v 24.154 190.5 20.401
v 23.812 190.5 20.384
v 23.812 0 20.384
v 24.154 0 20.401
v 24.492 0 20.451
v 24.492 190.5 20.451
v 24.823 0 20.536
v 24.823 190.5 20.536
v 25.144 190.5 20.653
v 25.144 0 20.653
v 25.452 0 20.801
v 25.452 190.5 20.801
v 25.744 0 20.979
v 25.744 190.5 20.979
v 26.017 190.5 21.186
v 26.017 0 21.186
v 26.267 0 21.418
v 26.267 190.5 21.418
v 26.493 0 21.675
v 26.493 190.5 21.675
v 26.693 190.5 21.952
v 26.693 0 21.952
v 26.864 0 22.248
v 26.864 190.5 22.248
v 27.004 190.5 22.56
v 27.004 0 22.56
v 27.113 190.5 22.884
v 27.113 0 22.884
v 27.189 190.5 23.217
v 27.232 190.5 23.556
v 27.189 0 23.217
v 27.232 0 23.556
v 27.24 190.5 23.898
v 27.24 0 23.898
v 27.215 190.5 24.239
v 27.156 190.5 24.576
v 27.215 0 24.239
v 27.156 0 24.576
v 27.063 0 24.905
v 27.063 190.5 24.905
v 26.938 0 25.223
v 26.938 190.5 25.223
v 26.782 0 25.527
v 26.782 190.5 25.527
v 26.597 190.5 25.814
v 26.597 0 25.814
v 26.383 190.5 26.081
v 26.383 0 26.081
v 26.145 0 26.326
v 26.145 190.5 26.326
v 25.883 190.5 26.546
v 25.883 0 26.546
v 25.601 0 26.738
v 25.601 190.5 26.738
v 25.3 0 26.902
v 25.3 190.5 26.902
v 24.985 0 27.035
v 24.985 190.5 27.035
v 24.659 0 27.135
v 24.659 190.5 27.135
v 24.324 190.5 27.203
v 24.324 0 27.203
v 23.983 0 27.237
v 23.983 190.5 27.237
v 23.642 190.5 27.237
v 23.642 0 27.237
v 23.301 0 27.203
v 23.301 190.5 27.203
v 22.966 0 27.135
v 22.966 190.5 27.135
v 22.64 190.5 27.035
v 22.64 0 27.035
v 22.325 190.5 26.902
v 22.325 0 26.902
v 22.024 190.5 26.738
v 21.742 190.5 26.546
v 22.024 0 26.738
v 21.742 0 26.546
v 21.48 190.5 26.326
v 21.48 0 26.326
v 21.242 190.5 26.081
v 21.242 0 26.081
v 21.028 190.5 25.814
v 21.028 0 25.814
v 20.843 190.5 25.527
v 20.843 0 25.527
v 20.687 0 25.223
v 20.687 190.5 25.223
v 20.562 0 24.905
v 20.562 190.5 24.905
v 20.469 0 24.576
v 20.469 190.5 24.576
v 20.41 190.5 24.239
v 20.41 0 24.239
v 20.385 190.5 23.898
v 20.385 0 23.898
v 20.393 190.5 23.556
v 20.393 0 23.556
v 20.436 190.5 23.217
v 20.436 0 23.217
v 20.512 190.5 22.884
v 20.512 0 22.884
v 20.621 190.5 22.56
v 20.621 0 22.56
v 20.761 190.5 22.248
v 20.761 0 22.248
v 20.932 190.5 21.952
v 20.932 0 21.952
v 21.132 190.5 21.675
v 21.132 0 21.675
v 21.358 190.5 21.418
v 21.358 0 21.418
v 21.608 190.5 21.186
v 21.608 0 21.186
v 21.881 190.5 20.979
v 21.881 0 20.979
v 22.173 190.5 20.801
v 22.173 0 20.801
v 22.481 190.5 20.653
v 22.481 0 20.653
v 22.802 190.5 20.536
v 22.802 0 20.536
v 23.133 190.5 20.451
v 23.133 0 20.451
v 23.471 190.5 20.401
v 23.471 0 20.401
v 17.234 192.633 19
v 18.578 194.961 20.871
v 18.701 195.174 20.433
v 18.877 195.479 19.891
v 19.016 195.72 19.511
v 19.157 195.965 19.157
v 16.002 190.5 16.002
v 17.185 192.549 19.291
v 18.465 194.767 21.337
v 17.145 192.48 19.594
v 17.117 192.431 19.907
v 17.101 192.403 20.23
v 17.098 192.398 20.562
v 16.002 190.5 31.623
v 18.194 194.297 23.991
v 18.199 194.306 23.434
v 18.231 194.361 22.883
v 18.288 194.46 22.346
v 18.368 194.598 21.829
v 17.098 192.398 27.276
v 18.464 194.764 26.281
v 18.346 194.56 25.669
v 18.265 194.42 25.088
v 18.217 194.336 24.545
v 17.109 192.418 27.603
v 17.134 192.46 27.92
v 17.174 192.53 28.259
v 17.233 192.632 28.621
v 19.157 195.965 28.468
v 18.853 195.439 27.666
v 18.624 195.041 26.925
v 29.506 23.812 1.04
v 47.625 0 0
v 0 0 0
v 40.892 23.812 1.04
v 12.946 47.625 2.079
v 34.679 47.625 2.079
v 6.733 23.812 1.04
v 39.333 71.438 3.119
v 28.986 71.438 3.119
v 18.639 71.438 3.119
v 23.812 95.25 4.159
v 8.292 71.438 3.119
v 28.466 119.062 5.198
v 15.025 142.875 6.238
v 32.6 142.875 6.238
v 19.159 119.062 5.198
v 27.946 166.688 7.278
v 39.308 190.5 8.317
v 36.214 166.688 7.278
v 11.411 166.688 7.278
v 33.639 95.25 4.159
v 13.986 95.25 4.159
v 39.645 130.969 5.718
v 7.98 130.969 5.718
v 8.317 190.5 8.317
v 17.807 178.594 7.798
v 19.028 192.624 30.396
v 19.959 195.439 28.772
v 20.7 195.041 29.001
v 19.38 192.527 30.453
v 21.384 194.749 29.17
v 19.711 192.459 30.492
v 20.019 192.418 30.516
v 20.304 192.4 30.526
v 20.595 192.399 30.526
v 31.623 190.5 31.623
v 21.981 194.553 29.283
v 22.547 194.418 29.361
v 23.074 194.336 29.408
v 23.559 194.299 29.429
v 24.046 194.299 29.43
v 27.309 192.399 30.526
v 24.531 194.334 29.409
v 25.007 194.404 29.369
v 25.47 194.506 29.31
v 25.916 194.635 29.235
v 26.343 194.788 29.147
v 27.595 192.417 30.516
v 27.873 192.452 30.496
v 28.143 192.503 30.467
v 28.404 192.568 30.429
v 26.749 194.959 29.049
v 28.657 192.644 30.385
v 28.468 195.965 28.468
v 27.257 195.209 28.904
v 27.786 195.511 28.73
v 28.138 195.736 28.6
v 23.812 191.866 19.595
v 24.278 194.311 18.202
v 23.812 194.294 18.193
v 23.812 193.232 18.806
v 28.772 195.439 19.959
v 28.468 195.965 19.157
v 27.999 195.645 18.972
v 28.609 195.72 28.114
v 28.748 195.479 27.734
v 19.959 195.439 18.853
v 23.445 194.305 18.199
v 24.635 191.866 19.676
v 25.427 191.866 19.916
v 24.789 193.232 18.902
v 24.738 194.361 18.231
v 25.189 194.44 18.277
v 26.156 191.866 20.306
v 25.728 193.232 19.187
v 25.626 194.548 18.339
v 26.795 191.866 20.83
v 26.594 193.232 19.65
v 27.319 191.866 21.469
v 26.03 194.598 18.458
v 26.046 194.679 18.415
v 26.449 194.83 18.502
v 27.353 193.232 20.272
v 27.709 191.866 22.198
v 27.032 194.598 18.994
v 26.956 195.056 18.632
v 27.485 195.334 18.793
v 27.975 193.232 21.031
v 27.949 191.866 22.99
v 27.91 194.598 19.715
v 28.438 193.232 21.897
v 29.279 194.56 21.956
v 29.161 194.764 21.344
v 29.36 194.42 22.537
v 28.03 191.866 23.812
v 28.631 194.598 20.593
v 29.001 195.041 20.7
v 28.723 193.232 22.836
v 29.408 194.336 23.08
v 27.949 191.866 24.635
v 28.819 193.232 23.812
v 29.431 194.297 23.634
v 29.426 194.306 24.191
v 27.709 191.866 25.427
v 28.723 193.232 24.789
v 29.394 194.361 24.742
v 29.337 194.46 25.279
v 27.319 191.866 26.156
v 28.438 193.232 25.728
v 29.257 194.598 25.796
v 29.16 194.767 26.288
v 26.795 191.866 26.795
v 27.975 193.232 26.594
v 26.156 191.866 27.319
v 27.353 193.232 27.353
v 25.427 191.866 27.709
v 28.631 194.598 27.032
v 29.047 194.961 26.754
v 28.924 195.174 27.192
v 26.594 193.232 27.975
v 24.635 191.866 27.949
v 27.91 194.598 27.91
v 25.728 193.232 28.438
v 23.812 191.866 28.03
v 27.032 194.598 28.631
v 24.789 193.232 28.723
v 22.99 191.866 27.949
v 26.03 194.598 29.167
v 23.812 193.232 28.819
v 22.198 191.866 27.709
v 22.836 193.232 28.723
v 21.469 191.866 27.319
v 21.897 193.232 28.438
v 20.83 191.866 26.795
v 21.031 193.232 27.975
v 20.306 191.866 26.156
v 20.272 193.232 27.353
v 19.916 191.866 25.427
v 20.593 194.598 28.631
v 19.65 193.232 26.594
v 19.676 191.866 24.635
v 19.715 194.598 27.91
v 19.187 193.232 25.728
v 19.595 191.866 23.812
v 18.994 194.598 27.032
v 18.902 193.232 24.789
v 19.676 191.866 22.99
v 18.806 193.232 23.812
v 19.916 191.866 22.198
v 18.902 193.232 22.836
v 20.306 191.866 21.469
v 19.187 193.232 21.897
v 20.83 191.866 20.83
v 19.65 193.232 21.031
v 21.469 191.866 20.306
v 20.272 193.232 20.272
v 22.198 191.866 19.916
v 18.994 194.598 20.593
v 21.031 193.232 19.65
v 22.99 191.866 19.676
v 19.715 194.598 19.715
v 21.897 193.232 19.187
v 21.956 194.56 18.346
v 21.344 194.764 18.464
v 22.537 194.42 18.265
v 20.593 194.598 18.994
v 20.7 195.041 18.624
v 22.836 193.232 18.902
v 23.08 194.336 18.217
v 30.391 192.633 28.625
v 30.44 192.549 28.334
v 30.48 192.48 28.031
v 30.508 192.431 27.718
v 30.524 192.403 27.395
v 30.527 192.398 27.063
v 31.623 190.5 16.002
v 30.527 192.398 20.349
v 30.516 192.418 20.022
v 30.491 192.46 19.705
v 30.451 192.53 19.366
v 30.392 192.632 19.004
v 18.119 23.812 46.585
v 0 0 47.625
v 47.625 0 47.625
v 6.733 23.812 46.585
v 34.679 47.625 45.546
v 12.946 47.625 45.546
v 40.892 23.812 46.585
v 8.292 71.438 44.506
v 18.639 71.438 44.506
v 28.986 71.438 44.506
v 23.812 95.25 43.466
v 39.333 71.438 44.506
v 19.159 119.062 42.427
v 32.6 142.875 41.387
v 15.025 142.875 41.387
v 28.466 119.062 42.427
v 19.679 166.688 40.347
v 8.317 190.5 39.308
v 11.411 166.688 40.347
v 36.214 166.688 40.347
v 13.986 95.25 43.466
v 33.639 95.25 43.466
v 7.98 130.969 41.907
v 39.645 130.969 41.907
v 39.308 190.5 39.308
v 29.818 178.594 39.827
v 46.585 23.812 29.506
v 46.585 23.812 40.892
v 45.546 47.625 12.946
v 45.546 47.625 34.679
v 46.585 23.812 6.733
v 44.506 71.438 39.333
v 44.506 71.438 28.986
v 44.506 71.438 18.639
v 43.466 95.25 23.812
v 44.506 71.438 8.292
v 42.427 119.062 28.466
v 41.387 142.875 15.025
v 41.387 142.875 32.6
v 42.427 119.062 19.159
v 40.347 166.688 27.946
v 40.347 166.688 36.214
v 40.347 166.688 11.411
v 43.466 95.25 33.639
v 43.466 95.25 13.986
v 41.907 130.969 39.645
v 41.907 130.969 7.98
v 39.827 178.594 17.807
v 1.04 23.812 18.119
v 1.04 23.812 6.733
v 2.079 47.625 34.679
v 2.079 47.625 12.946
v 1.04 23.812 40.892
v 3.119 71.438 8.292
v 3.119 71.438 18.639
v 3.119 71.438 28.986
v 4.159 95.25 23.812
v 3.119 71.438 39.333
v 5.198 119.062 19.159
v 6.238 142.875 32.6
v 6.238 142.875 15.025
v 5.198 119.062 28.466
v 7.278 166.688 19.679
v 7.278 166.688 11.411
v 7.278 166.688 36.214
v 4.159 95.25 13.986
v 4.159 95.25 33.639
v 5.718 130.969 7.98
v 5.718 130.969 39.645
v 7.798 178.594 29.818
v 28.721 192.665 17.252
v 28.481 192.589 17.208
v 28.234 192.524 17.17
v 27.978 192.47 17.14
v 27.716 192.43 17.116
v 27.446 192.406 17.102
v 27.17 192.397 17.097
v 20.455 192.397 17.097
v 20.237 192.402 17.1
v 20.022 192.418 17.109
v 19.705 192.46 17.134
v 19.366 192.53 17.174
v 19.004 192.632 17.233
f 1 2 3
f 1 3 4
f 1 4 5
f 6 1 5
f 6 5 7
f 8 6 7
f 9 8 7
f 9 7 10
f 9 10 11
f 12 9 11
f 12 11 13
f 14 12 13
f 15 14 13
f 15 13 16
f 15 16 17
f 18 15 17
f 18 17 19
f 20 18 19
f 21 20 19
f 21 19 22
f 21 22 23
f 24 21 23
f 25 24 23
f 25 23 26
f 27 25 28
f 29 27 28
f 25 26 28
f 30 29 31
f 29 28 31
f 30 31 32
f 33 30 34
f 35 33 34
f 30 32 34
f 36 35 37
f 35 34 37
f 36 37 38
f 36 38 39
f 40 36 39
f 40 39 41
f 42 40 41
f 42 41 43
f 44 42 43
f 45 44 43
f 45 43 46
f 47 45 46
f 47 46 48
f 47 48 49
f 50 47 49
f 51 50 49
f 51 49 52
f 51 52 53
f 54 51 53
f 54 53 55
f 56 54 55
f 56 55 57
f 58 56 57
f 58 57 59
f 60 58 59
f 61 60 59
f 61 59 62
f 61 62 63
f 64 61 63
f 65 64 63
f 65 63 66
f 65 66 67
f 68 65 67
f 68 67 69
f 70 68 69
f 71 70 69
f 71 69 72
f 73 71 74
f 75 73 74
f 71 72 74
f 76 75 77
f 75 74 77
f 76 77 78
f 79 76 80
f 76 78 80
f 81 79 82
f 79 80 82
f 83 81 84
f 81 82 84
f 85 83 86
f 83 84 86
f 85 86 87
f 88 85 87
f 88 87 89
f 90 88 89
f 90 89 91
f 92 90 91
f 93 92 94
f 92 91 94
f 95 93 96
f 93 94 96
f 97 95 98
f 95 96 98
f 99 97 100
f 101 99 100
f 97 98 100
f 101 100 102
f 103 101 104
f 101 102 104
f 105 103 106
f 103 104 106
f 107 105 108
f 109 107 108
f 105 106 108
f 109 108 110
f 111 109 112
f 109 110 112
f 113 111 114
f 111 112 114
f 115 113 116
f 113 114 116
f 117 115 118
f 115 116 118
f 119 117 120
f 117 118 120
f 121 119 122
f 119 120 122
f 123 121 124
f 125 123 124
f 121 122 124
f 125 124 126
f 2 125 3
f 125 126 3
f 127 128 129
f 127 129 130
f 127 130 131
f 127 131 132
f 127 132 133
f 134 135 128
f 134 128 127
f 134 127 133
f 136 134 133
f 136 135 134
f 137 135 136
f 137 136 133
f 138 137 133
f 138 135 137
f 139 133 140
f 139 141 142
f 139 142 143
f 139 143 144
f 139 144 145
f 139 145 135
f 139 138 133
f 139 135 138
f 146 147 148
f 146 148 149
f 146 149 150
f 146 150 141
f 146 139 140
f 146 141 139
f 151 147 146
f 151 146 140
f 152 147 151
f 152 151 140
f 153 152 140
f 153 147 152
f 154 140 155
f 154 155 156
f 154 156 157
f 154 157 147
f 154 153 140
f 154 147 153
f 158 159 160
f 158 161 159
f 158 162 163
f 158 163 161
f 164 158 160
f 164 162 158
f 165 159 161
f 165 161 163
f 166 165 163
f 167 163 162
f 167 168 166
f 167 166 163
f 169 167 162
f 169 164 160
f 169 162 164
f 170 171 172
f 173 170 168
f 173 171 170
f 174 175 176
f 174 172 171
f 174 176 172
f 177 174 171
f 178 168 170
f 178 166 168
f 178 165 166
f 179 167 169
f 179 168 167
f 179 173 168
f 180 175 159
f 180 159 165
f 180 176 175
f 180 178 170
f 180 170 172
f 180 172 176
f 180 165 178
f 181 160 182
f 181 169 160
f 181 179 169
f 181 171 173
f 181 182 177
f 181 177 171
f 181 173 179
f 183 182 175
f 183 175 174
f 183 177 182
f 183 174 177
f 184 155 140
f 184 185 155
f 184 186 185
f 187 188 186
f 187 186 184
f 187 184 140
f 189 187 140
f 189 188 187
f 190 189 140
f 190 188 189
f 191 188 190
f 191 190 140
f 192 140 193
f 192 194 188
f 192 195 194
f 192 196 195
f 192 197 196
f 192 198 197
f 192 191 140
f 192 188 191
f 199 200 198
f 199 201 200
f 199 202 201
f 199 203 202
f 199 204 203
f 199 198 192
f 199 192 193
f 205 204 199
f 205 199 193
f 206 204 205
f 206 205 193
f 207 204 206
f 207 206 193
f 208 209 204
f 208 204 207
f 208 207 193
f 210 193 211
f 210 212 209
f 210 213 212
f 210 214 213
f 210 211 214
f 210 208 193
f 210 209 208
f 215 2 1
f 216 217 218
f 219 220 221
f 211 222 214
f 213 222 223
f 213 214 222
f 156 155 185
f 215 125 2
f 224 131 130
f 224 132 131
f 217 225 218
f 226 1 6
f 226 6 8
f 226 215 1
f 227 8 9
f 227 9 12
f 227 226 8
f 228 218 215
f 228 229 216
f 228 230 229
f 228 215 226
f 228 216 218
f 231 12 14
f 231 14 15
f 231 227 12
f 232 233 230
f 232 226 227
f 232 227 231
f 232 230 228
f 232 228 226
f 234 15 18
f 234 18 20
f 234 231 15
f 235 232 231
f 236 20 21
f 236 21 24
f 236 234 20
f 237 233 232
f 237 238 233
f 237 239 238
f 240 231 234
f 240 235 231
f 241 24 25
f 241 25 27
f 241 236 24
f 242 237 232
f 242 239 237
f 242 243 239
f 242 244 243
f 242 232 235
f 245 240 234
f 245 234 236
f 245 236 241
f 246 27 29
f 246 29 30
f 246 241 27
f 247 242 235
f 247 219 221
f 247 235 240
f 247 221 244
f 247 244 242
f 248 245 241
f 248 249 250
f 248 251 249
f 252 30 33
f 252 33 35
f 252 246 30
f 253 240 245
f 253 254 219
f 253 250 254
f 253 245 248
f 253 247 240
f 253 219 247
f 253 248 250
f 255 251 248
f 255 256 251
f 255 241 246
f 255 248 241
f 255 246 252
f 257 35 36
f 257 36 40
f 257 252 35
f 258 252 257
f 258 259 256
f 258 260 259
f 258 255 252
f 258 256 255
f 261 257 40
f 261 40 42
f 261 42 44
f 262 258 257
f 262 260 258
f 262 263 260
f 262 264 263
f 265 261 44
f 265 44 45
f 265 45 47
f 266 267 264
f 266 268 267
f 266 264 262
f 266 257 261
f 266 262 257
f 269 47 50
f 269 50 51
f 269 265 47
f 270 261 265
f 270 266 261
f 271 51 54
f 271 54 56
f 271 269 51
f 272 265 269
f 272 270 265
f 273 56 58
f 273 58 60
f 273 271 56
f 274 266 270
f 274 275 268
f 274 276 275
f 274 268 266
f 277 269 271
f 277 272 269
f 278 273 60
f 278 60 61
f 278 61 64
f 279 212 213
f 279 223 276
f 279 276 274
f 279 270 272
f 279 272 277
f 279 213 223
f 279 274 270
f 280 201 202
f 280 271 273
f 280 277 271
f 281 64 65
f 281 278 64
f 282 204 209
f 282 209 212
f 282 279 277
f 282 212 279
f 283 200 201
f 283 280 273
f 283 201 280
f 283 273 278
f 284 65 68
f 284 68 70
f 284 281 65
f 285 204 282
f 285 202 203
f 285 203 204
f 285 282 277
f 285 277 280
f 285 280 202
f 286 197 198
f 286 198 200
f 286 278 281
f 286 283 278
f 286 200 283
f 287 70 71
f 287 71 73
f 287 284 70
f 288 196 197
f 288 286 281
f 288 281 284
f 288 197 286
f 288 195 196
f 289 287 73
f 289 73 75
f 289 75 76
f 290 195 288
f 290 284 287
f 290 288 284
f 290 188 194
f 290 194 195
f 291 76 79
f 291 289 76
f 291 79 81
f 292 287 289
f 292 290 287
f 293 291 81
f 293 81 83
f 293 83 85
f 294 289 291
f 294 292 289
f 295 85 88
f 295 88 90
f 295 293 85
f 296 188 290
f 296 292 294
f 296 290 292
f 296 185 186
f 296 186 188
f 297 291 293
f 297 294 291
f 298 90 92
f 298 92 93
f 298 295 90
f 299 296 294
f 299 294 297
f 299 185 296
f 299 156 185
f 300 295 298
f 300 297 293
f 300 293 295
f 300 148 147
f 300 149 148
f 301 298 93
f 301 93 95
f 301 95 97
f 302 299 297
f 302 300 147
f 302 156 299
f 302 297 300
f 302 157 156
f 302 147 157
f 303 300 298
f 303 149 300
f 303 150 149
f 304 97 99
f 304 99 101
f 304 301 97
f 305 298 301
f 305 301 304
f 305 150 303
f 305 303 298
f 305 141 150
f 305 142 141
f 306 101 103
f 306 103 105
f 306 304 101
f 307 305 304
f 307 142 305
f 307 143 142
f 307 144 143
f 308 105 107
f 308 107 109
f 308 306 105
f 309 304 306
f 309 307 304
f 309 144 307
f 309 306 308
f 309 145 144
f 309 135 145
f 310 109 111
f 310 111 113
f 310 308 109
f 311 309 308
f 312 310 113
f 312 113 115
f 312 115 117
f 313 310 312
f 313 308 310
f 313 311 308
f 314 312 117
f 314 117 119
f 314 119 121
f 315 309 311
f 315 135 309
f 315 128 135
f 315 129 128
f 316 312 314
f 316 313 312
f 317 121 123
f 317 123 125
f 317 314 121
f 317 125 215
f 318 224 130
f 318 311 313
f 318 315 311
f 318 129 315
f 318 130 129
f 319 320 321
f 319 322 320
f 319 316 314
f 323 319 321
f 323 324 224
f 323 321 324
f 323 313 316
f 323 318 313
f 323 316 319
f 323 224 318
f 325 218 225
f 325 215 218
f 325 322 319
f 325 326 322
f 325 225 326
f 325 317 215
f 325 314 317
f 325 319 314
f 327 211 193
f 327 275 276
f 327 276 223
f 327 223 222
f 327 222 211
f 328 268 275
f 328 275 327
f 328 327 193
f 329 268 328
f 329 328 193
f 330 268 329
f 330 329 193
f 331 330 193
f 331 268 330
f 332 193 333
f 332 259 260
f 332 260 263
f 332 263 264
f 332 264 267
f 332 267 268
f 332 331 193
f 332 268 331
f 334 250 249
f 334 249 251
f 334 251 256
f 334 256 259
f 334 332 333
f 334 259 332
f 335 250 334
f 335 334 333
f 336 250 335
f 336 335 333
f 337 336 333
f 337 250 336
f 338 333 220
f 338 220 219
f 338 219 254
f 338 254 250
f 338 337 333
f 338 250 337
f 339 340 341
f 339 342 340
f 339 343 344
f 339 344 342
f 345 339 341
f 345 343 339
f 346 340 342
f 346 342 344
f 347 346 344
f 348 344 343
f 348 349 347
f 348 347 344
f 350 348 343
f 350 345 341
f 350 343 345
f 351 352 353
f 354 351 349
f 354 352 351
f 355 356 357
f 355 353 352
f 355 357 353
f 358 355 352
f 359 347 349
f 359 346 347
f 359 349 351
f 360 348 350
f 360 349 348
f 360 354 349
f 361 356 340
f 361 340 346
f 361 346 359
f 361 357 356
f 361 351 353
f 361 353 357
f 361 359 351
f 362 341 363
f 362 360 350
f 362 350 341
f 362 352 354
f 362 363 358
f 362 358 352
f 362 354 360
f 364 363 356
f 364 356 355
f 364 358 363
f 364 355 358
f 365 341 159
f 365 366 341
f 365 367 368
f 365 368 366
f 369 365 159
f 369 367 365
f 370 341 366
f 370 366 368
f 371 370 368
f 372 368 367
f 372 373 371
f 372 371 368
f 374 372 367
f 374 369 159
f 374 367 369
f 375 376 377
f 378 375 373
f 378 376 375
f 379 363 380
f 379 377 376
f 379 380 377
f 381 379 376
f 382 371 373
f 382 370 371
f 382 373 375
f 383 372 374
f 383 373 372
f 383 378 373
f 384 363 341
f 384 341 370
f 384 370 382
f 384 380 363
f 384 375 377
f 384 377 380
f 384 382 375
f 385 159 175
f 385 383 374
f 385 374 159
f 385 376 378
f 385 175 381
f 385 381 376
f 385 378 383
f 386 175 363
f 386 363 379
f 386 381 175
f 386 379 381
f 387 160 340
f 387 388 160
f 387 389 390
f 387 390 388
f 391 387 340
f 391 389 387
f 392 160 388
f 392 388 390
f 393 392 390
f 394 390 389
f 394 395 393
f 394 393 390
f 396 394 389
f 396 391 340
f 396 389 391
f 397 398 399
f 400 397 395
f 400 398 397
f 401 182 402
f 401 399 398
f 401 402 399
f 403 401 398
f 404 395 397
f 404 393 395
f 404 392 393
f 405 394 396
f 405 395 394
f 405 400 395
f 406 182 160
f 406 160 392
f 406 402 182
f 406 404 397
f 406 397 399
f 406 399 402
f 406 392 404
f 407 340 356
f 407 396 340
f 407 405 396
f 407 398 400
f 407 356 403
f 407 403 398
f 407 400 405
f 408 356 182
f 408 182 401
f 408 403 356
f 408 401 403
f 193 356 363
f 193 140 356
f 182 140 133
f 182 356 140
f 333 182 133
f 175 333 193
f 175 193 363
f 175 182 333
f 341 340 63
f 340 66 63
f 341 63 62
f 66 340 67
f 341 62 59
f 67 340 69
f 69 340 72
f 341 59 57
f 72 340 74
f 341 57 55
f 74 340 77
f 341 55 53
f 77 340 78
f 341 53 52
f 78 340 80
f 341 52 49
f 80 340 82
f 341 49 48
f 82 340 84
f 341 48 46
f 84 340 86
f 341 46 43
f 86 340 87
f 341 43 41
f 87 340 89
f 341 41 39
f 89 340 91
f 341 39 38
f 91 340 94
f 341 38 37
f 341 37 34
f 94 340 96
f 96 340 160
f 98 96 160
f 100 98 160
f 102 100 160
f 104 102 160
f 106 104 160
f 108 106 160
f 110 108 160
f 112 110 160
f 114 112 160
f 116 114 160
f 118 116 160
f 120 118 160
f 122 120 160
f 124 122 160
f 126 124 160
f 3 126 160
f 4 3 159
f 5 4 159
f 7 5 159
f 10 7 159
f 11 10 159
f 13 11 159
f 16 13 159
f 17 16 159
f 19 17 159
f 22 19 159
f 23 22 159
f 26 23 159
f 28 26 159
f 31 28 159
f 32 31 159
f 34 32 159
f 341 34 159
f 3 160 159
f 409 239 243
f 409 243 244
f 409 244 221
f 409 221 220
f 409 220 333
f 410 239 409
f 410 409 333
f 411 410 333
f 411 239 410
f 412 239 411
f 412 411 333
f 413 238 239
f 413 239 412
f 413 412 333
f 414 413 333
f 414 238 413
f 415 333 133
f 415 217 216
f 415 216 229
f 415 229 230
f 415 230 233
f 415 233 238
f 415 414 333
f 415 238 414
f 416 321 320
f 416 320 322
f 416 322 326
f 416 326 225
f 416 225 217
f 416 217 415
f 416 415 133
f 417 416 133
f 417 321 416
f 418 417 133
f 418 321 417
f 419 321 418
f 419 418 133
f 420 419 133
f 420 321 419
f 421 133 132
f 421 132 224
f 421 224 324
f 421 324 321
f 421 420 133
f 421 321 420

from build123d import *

# Parameters (mm, degrees)
SKETCH1_W           = 47.625
SKETCH1_H           = 47.625
BOSS_EXTRUDE1_DEPTH = 381
BOSS_EXTRUDE1_TAPER = 2.5
SKETCH2_R           = 3.429
CUT_EXTRUDE1_DEPTH  = 381
SKETCH5_W           = 47.625
SKETCH5_H           = 47.625
CUT_EXTRUDE4_DEPTH  = 190.5
SKETCH6_W           = 15.621
SKETCH6_H           = 15.621
SKETCH6_R           = 3.429
BOSS_EXTRUDE2_DEPTH = 6.35
BOSS_EXTRUDE2_TAPER = 30


with BuildPart() as part:
    # Sketch1 → Boss-Extrude1 (new body)
    with BuildSketch(Plane(origin=(0, 0, 0), x_dir=(1, 0, 0), z_dir=(0, 1, 0))):
        with Locations((23.8125, -23.8125)):
            Rectangle(SKETCH1_W, SKETCH1_H)
    extrude(amount=BOSS_EXTRUDE1_DEPTH, taper=BOSS_EXTRUDE1_TAPER)

    # Sketch2 → Cut-Extrude1 (cut)
    with BuildSketch(Plane.XZ):
        with Locations(Location((23.8125, 23.8125, 0), (0, 0, 270))):
            Circle(SKETCH2_R)
    extrude(amount=-CUT_EXTRUDE1_DEPTH, mode=Mode.SUBTRACT)

    # Sketch5 → Cut-Extrude4 (cut)
    with BuildSketch(Plane(origin=(0, 381, 0), x_dir=(1, 0, 0), z_dir=(0, 1, 0))):
        with Locations((23.8125, -23.8125)):
            Rectangle(SKETCH5_W, SKETCH5_H)
    extrude(amount=-CUT_EXTRUDE4_DEPTH, mode=Mode.SUBTRACT)

    # Sketch6 → Boss-Extrude2 (add)
    with BuildSketch(Plane(origin=(0, 190.5, 0), x_dir=(1, 0, 0), z_dir=(0, 1, 0))):
        with Locations((23.8125, -23.8125)):
            Rectangle(SKETCH6_W, SKETCH6_H)
        with Locations(Location((23.8125, -23.8125, 0), (0, 0, 90))):
            Circle(SKETCH6_R, mode=Mode.SUBTRACT)
    extrude(amount=BOSS_EXTRUDE2_DEPTH, taper=BOSS_EXTRUDE2_TAPER)


solid = part.part
